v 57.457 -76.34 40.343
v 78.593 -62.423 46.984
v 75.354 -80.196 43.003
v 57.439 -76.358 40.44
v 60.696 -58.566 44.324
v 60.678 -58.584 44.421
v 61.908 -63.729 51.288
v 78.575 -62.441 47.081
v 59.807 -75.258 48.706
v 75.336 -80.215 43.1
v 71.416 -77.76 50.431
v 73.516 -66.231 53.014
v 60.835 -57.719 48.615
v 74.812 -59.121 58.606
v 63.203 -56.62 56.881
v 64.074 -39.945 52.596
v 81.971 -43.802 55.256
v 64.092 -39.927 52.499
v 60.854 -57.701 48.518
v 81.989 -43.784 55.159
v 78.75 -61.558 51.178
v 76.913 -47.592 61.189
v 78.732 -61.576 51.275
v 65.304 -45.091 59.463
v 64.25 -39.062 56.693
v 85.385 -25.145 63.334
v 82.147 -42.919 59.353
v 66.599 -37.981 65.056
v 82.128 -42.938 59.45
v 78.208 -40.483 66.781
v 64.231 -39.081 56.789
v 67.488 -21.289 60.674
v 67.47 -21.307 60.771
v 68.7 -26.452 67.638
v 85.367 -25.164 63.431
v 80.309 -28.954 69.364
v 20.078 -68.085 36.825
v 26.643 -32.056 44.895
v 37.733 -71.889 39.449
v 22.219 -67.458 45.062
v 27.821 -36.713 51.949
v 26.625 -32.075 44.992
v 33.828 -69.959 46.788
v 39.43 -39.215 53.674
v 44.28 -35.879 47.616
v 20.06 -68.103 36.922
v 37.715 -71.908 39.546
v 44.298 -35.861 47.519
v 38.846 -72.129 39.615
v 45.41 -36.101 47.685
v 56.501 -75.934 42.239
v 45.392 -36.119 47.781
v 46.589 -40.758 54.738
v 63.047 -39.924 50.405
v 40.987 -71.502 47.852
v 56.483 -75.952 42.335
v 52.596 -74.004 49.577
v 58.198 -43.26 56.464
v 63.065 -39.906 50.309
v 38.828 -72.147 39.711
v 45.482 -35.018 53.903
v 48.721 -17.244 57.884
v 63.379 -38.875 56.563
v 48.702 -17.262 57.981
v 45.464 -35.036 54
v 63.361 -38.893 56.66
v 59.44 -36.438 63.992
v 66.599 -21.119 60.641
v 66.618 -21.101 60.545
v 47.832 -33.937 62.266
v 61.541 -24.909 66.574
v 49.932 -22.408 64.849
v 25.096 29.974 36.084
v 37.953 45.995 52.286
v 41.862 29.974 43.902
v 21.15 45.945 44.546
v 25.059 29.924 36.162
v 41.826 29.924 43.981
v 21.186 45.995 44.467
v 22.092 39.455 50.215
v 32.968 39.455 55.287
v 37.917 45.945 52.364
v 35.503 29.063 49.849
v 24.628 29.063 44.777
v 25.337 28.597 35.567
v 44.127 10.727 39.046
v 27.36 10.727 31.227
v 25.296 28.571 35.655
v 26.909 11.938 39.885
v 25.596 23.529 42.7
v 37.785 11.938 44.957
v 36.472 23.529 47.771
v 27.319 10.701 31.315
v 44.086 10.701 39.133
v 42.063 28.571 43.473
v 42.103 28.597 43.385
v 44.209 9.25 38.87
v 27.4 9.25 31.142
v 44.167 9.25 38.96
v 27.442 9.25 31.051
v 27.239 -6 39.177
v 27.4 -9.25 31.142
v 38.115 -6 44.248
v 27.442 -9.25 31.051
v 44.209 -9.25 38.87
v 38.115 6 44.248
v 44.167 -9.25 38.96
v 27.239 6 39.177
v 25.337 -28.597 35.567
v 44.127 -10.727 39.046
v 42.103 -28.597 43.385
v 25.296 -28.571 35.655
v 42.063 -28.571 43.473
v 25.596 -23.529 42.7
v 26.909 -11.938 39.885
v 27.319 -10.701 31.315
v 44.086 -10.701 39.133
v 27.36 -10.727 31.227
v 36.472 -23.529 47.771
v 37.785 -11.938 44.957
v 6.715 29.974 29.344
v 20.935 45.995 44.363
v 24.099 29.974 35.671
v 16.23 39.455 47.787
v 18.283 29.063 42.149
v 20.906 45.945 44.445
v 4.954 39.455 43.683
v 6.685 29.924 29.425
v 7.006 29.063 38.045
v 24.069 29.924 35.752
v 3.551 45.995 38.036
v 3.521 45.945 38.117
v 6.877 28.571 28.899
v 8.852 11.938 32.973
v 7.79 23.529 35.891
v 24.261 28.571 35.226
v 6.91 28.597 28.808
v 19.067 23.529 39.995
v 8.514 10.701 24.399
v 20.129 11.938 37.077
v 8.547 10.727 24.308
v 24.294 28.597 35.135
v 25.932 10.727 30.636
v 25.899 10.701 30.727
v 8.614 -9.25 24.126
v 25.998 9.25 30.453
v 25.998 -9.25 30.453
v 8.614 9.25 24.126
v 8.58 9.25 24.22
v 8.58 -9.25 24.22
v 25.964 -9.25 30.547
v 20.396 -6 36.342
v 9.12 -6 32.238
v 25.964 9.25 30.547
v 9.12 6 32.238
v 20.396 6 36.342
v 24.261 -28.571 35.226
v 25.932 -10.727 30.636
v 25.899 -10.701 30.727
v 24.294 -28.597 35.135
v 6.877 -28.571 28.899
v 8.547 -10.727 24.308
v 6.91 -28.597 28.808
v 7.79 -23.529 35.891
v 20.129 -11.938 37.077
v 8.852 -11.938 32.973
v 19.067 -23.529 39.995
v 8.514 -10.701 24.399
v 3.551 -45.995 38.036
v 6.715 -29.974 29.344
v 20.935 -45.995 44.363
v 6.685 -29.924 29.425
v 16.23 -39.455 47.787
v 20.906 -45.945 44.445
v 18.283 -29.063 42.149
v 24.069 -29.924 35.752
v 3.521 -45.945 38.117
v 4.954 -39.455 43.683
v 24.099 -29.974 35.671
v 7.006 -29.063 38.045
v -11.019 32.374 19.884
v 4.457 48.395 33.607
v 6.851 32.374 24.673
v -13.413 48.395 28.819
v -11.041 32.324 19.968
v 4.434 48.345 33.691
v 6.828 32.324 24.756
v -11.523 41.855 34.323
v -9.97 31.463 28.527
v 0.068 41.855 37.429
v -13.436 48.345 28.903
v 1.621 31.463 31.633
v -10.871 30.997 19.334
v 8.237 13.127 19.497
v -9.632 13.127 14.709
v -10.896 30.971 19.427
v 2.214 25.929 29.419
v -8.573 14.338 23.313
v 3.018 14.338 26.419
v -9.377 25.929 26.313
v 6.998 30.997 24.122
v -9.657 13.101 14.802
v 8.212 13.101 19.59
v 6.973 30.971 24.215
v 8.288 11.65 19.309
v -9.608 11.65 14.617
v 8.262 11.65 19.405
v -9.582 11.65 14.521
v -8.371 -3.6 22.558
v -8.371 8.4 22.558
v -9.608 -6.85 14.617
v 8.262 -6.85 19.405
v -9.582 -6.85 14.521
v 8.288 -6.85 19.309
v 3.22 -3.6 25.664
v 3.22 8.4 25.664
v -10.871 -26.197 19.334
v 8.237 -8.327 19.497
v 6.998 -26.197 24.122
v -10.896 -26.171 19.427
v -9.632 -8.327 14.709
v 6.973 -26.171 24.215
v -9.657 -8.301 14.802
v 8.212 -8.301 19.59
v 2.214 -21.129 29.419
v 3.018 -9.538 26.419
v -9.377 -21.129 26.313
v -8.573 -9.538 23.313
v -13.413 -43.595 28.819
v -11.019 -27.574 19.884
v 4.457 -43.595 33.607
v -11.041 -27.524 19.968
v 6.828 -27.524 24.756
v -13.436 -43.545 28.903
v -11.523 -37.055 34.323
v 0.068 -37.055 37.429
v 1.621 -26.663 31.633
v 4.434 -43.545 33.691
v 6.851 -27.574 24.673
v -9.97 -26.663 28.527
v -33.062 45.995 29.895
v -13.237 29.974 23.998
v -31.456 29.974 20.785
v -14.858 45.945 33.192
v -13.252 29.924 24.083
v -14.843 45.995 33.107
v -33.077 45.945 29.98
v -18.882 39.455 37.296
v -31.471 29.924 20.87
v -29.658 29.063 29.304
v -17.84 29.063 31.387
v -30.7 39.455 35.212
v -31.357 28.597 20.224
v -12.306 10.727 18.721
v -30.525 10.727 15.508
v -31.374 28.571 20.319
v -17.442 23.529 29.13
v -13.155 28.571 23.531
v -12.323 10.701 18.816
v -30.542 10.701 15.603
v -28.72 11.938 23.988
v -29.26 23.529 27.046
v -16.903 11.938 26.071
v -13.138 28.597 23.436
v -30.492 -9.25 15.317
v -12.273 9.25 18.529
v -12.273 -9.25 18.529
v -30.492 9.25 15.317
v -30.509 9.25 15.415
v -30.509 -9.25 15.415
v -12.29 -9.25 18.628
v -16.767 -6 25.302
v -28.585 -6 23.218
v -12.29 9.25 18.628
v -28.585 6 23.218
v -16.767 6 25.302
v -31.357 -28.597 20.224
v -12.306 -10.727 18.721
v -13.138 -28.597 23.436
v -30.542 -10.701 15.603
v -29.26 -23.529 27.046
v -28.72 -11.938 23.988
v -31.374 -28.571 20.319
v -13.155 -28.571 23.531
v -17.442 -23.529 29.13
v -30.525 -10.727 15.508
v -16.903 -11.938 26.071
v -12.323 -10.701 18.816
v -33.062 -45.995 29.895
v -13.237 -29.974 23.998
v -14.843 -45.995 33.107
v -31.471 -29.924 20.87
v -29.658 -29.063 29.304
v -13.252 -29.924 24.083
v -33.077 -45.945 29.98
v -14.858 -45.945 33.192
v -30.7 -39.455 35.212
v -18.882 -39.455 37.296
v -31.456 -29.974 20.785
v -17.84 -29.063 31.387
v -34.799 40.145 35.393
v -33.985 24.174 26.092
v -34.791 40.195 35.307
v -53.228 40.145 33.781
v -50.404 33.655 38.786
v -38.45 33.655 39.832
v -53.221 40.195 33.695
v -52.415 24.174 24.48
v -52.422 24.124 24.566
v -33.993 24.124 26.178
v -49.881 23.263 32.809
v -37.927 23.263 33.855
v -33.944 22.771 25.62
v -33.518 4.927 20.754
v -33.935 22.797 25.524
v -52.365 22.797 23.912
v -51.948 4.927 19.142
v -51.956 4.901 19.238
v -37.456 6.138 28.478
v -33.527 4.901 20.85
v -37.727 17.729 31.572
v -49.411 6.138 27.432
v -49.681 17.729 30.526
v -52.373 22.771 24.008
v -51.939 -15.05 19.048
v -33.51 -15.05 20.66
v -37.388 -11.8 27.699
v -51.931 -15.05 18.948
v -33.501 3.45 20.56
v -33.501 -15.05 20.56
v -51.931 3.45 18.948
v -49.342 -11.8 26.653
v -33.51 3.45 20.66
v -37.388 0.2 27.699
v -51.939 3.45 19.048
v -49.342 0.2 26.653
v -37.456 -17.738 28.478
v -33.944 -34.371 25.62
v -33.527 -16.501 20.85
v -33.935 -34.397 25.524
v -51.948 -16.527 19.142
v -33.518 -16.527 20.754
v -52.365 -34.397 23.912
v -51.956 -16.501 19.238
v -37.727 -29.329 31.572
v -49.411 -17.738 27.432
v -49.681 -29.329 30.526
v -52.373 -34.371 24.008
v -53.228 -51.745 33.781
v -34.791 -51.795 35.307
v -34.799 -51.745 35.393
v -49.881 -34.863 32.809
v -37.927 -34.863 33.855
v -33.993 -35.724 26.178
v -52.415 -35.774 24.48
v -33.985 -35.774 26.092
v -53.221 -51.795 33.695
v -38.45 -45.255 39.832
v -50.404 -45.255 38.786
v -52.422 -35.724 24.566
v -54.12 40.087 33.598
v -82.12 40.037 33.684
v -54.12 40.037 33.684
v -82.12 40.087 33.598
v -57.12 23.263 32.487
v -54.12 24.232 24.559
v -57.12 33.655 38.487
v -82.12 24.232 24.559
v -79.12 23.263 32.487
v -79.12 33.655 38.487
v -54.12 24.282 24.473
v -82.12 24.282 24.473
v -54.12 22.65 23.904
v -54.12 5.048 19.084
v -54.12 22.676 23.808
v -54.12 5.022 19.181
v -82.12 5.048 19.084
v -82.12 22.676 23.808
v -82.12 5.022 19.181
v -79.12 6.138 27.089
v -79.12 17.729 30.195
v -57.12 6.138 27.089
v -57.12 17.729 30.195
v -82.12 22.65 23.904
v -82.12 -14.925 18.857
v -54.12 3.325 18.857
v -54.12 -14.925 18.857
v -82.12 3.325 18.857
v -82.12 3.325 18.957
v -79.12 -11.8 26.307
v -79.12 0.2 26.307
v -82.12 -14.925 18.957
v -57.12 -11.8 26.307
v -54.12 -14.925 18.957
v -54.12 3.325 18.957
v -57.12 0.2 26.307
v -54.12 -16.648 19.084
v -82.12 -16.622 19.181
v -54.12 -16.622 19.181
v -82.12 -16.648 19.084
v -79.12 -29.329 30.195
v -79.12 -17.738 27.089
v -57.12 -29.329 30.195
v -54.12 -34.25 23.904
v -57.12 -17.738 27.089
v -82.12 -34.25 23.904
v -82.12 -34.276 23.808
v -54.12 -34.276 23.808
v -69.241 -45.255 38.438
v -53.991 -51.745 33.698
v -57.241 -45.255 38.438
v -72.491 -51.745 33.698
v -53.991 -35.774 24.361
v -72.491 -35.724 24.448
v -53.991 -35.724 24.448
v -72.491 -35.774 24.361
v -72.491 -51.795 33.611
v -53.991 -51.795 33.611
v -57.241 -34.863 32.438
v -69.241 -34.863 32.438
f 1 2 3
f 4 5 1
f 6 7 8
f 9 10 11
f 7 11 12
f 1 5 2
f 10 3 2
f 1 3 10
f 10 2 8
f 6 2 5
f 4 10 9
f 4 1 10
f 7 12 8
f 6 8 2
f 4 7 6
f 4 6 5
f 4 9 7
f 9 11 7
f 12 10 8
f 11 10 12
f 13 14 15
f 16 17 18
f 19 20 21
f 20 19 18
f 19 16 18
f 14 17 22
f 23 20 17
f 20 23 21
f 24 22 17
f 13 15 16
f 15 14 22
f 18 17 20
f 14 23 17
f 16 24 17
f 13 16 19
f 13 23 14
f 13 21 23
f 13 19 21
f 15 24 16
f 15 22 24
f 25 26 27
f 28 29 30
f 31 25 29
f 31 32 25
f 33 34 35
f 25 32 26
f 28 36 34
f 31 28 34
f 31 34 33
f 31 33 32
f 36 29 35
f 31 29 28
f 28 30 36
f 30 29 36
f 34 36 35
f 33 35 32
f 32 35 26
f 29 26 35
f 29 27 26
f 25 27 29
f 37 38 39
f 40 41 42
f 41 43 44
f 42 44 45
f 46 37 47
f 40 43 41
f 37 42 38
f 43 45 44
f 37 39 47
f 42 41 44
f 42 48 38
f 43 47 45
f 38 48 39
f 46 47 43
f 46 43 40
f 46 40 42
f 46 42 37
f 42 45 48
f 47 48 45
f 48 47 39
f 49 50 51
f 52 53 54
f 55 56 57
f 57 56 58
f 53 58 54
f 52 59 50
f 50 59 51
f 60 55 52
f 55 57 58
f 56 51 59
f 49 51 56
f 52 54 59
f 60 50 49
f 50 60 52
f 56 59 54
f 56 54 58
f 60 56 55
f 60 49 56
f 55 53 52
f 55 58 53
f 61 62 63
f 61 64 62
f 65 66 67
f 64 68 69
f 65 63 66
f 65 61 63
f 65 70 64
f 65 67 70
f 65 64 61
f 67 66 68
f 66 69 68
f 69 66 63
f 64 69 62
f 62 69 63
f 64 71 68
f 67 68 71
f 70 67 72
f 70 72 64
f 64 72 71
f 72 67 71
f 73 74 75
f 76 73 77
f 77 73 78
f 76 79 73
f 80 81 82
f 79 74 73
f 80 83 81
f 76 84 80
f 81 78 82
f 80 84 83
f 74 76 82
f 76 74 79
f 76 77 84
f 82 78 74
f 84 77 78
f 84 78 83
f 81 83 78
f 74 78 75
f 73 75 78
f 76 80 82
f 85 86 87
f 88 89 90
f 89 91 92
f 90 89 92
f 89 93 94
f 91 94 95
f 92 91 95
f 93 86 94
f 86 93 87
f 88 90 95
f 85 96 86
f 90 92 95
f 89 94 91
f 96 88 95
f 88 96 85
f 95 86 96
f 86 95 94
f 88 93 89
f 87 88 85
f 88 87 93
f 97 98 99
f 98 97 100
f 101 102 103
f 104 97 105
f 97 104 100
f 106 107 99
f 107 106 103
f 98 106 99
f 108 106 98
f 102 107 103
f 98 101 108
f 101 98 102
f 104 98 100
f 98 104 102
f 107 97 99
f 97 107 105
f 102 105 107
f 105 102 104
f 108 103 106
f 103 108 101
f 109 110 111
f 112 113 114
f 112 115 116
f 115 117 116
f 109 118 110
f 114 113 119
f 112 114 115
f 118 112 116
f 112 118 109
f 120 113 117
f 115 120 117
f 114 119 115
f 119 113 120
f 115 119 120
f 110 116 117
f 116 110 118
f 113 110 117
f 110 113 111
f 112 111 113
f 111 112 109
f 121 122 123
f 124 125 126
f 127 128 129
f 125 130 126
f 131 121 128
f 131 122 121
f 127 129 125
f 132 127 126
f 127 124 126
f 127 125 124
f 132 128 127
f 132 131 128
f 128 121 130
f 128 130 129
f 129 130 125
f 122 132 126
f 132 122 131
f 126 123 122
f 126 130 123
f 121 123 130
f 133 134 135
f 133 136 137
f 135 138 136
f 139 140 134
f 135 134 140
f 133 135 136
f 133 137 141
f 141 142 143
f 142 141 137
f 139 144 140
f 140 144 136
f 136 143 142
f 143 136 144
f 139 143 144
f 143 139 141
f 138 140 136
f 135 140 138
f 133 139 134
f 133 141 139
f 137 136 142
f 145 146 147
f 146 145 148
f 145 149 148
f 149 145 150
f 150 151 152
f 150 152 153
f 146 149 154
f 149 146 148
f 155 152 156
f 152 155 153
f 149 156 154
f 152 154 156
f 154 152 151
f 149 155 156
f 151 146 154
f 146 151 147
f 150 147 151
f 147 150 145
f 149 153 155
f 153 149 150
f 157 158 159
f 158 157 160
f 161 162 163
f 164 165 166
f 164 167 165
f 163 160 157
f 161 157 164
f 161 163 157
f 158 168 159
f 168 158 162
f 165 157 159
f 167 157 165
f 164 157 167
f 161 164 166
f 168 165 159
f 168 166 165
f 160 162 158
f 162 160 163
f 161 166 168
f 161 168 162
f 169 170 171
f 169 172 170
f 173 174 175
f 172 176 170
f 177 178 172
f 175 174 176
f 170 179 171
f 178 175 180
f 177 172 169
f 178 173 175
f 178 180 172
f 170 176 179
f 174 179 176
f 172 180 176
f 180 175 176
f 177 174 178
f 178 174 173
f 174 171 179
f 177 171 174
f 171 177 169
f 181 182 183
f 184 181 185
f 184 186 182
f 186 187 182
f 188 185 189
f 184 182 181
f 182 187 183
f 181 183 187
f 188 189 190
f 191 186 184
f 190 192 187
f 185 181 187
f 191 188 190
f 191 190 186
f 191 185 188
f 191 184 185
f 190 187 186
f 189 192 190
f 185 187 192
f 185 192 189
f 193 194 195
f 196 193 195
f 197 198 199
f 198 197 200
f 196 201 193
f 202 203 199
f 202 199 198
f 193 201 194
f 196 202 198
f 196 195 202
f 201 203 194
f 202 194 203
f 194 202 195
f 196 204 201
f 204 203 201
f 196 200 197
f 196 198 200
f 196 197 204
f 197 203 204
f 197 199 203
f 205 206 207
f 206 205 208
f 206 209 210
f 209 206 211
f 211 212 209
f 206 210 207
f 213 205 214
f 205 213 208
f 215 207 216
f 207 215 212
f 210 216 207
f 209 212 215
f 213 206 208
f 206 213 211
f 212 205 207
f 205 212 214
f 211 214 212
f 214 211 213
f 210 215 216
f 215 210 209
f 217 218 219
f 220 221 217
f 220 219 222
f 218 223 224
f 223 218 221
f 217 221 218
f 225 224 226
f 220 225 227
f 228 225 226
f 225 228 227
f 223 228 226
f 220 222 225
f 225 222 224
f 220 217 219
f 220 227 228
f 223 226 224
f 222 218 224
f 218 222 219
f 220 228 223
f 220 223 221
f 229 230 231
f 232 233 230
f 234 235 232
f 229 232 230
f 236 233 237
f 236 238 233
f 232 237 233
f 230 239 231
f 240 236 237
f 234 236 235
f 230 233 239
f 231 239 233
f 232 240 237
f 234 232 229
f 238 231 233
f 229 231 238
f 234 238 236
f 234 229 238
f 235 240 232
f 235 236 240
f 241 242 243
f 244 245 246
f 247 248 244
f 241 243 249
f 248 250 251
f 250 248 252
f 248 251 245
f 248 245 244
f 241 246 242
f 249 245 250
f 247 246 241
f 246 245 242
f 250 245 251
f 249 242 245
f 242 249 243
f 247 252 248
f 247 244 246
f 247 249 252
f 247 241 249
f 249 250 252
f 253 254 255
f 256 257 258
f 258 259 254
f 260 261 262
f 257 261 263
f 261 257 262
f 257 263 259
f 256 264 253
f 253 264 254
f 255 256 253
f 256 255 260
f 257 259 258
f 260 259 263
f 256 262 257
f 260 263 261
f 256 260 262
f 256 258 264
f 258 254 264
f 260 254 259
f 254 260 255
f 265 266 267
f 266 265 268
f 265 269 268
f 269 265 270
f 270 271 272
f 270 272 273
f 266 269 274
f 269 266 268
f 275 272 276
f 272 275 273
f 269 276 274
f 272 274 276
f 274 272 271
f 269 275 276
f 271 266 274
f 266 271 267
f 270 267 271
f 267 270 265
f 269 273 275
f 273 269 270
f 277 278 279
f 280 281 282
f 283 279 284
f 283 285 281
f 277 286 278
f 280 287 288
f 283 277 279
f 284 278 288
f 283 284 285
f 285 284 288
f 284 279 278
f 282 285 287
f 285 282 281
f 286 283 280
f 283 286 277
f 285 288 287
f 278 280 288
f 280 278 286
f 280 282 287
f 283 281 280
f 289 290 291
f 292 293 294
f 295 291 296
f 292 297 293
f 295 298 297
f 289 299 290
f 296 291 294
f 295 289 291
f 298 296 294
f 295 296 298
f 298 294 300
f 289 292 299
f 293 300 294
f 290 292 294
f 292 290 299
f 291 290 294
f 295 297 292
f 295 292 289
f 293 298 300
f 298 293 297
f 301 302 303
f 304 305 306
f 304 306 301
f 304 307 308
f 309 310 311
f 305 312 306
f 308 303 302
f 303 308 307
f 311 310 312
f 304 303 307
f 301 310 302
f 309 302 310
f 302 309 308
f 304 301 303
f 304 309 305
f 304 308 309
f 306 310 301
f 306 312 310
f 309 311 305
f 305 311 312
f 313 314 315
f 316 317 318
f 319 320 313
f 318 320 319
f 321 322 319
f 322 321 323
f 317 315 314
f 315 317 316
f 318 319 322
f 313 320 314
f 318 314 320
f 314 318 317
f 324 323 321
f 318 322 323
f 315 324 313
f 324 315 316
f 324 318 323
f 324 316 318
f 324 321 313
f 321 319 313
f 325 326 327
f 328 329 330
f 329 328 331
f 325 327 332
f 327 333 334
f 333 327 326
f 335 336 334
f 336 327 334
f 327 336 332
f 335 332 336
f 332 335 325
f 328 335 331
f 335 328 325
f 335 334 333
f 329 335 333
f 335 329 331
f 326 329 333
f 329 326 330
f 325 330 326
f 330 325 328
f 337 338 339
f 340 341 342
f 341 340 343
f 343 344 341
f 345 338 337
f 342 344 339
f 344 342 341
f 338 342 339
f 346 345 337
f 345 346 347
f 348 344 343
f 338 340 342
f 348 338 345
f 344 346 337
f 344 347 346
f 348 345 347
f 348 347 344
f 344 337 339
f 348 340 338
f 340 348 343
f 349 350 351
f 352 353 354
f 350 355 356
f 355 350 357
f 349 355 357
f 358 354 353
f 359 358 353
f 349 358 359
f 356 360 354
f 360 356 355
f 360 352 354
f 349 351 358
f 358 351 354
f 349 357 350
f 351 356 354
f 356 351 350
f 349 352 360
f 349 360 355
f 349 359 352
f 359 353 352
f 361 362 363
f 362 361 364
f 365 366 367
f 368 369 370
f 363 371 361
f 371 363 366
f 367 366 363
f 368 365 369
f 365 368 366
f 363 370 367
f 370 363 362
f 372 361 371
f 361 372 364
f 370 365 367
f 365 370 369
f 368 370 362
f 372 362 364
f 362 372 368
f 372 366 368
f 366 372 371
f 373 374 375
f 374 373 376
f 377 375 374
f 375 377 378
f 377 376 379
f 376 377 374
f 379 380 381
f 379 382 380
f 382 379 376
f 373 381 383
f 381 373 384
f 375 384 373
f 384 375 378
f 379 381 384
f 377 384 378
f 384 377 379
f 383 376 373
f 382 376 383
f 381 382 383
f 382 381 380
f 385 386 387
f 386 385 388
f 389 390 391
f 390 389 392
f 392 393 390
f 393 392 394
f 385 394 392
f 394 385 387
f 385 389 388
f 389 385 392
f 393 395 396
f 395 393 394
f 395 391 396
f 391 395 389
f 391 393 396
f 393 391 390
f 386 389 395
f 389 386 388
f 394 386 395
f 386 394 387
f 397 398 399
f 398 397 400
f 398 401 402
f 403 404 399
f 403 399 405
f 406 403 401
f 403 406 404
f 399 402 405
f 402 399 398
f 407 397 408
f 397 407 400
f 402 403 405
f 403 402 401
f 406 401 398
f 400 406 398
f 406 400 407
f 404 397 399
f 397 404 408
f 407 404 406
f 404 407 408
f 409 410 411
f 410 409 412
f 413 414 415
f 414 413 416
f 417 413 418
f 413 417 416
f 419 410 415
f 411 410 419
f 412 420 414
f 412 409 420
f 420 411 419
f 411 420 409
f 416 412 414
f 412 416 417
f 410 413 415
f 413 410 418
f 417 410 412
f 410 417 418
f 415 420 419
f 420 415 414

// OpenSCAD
mirror ([-1, 0, 0]) {
  union () {
    union () {
      translate ([-52, -45, 40]) {
        rotate (a=14.999999999999998, v=[1, 1, 0]) {
          rotate (a=11.25, v=[0, 0, 1]) {
            translate ([-0.0, -9.7, 0]) {
              translate ([17.4, 0, 0]) {
                color ([127/255, 53/85, 127/255, 1]) {
                  translate ([0, 0, 7]) {
                    hull () {
                      translate ([0, 0, 0.05]) {
                        linear_extrude (height=0.1, twist=0.0, convexity=0, center=true){
                          polygon (points=[[9.125, 18.75], [9.125, -18.75], [-9.125, -18.75], [-9.125, 18.75]]);
                        }
                      }
                      translate ([0, 0, 7.4]) {
                        linear_extrude (height=0.1, twist=0.0, convexity=0, center=true){
                          polygon (points=[[6, 16], [6, -16], [-6, -16], [-6, 16]]);
                        }
                      }
                    }
                  }
                }
              }
            }
          }
        }
      }
      translate ([-52, -45, 40]) {
        rotate (a=14.999999999999998, v=[1, 1, 0]) {
          rotate (a=11.25, v=[0, 0, 1]) {
            translate ([-19.4, -9.7, 0]) {
              translate ([17.4, 0, 0]) {
                color ([127/255, 53/85, 127/255, 1]) {
                  translate ([0, 0, 7]) {
                    hull () {
                      translate ([0, 0, 0.05]) {
                        linear_extrude (height=0.1, twist=0.0, convexity=0, center=true){
                          polygon (points=[[9.125, 18.75], [9.125, -18.75], [-9.125, -18.75], [-9.125, 18.75]]);
                        }
                      }
                      translate ([0, 0, 7.4]) {
                        linear_extrude (height=0.1, twist=0.0, convexity=0, center=true){
                          polygon (points=[[6, 16], [6, -16], [-6, -16], [-6, 16]]);
                        }
                      }
                    }
                  }
                }
              }
            }
          }
        }
      }
      translate ([-52, -45, 46]) {
        rotate (a=14.999999999999998, v=[1, 1, 0]) {
          rotate (a=11.25, v=[0, 0, 1]) {
            translate ([-19.4, 19.4, 0]) {
              translate ([17.4, 0, 0]) {
                color ([44/51, 163/255, 163/255, 1]) {
                  translate ([0, 0, 7]) {
                    hull () {
                      translate ([0, 0, 0.05]) {
                        linear_extrude (height=0.1, twist=0.0, convexity=0, center=true){
                          polygon (points=[[9.25, 9.25], [9.25, -9.25], [-9.25, -9.25], [-9.25, 9.25]]);
                        }
                      }
                      translate ([0, 0, 6]) {
                        linear_extrude (height=0.1, twist=0.0, convexity=0, center=true){
                          polygon (points=[[3.7, 3.7], [3.7, -3.7], [-3.7, -3.7], [-3.7, 3.7]]);
                        }
                      }
                      translate ([0, 0, 7.4]) {
                        linear_extrude (height=0.1, twist=0.0, convexity=0, center=true){
                          polygon (points=[[6, 6], [6, -6], [-6, -6], [-6, 6]]);
                        }
                      }
                    }
                  }
                }
              }
            }
          }
        }
      }
      union () {
        translate ([-52, -45, 38]) {
          rotate (a=14.999999999999998, v=[1, 1, 0]) {
            rotate (a=11.25, v=[0, 0, 1]) {
              translate ([-38.8, -19.4, 0]) {
                translate ([17.4, 0, 0]) {
                  color ([44/51, 163/255, 163/255, 1]) {
                    translate ([0, 0, 7]) {
                      hull () {
                        translate ([0, 0, 0.05]) {
                          linear_extrude (height=0.1, twist=0.0, convexity=0, center=true){
                            polygon (points=[[9.25, 9.25], [9.25, -9.25], [-9.25, -9.25], [-9.25, 9.25]]);
                          }
                        }
                        translate ([0, 0, 6]) {
                          linear_extrude (height=0.1, twist=0.0, convexity=0, center=true){
                            polygon (points=[[3.7, 3.7], [3.7, -3.7], [-3.7, -3.7], [-3.7, 3.7]]);
                          }
                        }
                        translate ([0, 0, 7.4]) {
                          linear_extrude (height=0.1, twist=0.0, convexity=0, center=true){
                            polygon (points=[[6, 6], [6, -6], [-6, -6], [-6, 6]]);
                          }
                        }
                      }
                    }
                  }
                }
              }
            }
          }
        }
        translate ([-52, -45, 42]) {
          rotate (a=14.999999999999998, v=[1, 1, 0]) {
            rotate (a=11.25, v=[0, 0, 1]) {
              translate ([-38.8, 0.0, 0]) {
                translate ([17.4, 0, 0]) {
                  color ([44/51, 163/255, 163/255, 1]) {
                    translate ([0, 0, 7]) {
                      hull () {
                        translate ([0, 0, 0.05]) {
                          linear_extrude (height=0.1, twist=0.0, convexity=0, center=true){
                            polygon (points=[[9.25, 9.25], [9.25, -9.25], [-9.25, -9.25], [-9.25, 9.25]]);
                          }
                        }
                        translate ([0, 0, 6]) {
                          linear_extrude (height=0.1, twist=0.0, convexity=0, center=true){
                            polygon (points=[[3.7, 3.7], [3.7, -3.7], [-3.7, -3.7], [-3.7, 3.7]]);
                          }
                        }
                        translate ([0, 0, 7.4]) {
                          linear_extrude (height=0.1, twist=0.0, convexity=0, center=true){
                            polygon (points=[[6, 6], [6, -6], [-6, -6], [-6, 6]]);
                          }
                        }
                      }
                    }
                  }
                }
              }
            }
          }
        }
        translate ([-52, -45, 46]) {
          rotate (a=14.999999999999998, v=[1, 1, 0]) {
            rotate (a=11.25, v=[0, 0, 1]) {
              translate ([-38.8, 19.4, 0]) {
                translate ([17.4, 0, 0]) {
                  color ([44/51, 163/255, 163/255, 1]) {
                    translate ([0, 0, 7]) {
                      hull () {
                        translate ([0, 0, 0.05]) {
                          linear_extrude (height=0.1, twist=0.0, convexity=0, center=true){
                            polygon (points=[[9.25, 9.25], [9.25, -9.25], [-9.25, -9.25], [-9.25, 9.25]]);
                          }
                        }
                        translate ([0, 0, 6]) {
                          linear_extrude (height=0.1, twist=0.0, convexity=0, center=true){
                            polygon (points=[[3.7, 3.7], [3.7, -3.7], [-3.7, -3.7], [-3.7, 3.7]]);
                          }
                        }
                        translate ([0, 0, 7.4]) {
                          linear_extrude (height=0.1, twist=0.0, convexity=0, center=true){
                            polygon (points=[[6, 6], [6, -6], [-6, -6], [-6, 6]]);
                          }
                        }
                      }
                    }
                  }
                }
              }
            }
          }
        }
      }
    }
    union () {
      translate ([0, 0, 14.5]) {
        rotate (a=14.999999999999998, v=[0, 1, 0]) {
          translate ([0, 0, 0]) {
            translate ([0, 0, 236.77818057271747]) {
              rotate (a=10.0, v=[0, 1, 0]) {
                translate ([0, 0, -236.77818057271747]) {
                  translate ([0, 0, 82.96861330108649]) {
                    rotate (a=29.999999999999996, v=[1, 0, 0]) {
                      translate ([0, 0, -82.96861330108649]) {
                        color ([44/51, 163/255, 163/255, 1]) {
                          translate ([0, 0, 7]) {
                            hull () {
                              translate ([0, 0, 0.05]) {
                                linear_extrude (height=0.1, twist=0.0, convexity=0, center=true){
                                  polygon (points=[[9.25, 9.25], [9.25, -9.25], [-9.25, -9.25], [-9.25, 9.25]]);
                                }
                              }
                              translate ([0, 0, 6]) {
                                linear_extrude (height=0.1, twist=0.0, convexity=0, center=true){
                                  polygon (points=[[3.7, 3.7], [3.7, -3.7], [-3.7, -3.7], [-3.7, 3.7]]);
                                }
                              }
                              translate ([0, 0, 7.4]) {
                                linear_extrude (height=0.1, twist=0.0, convexity=0, center=true){
                                  polygon (points=[[6, 6], [6, -6], [-6, -6], [-6, 6]]);
                                }
                              }
                            }
                          }
                        }
                      }
                    }
                  }
                }
              }
            }
          }
        }
      }
      translate ([0, 0, 14.5]) {
        rotate (a=14.999999999999998, v=[0, 1, 0]) {
          translate ([0, 0, 0]) {
            translate ([0, 0, 236.77818057271747]) {
              rotate (a=10.0, v=[0, 1, 0]) {
                translate ([0, 0, -236.77818057271747]) {
                  translate ([0, 0, 82.96861330108649]) {
                    rotate (a=14.999999999999998, v=[1, 0, 0]) {
                      translate ([0, 0, -82.96861330108649]) {
                        color ([44/51, 163/255, 163/255, 1]) {
                          translate ([0, 0, 7]) {
                            hull () {
                              translate ([0, 0, 0.05]) {
                                linear_extrude (height=0.1, twist=0.0, convexity=0, center=true){
                                  polygon (points=[[9.25, 9.25], [9.25, -9.25], [-9.25, -9.25], [-9.25, 9.25]]);
                                }
                              }
                              translate ([0, 0, 6]) {
                                linear_extrude (height=0.1, twist=0.0, convexity=0, center=true){
                                  polygon (points=[[3.7, 3.7], [3.7, -3.7], [-3.7, -3.7], [-3.7, 3.7]]);
                                }
                              }
                              translate ([0, 0, 7.4]) {
                                linear_extrude (height=0.1, twist=0.0, convexity=0, center=true){
                                  polygon (points=[[6, 6], [6, -6], [-6, -6], [-6, 6]]);
                                }
                              }
                            }
                          }
                        }
                      }
                    }
                  }
                }
              }
            }
          }
        }
      }
      translate ([0, 0, 14.5]) {
        rotate (a=14.999999999999998, v=[0, 1, 0]) {
          translate ([0, 0, 0]) {
            translate ([0, 0, 236.77818057271747]) {
              rotate (a=10.0, v=[0, 1, 0]) {
                translate ([0, 0, -236.77818057271747]) {
                  translate ([0, 0, 82.96861330108649]) {
                    rotate (a=0.0, v=[1, 0, 0]) {
                      translate ([0, 0, -82.96861330108649]) {
                        color ([44/51, 163/255, 163/255, 1]) {
                          translate ([0, 0, 7]) {
                            hull () {
                              translate ([0, 0, 0.05]) {
                                linear_extrude (height=0.1, twist=0.0, convexity=0, center=true){
                                  polygon (points=[[9.25, 9.25], [9.25, -9.25], [-9.25, -9.25], [-9.25, 9.25]]);
                                }
                              }
                              translate ([0, 0, 6]) {
                                linear_extrude (height=0.1, twist=0.0, convexity=0, center=true){
                                  polygon (points=[[3.7, 3.7], [3.7, -3.7], [-3.7, -3.7], [-3.7, 3.7]]);
                                }
                              }
                              translate ([0, 0, 7.4]) {
                                linear_extrude (height=0.1, twist=0.0, convexity=0, center=true){
                                  polygon (points=[[6, 6], [6, -6], [-6, -6], [-6, 6]]);
                                }
                              }
                            }
                          }
                        }
                      }
                    }
                  }
                }
              }
            }
          }
        }
      }
      translate ([0, 0, 14.5]) {
        rotate (a=14.999999999999998, v=[0, 1, 0]) {
          translate ([0, 0, 0]) {
            translate ([0, 0, 236.77818057271747]) {
              rotate (a=10.0, v=[0, 1, 0]) {
                translate ([0, 0, -236.77818057271747]) {
                  translate ([0, 0, 82.96861330108649]) {
                    rotate (a=-14.999999999999998, v=[1, 0, 0]) {
                      translate ([0, 0, -82.96861330108649]) {
                        color ([44/51, 163/255, 163/255, 1]) {
                          translate ([0, 0, 7]) {
                            hull () {
                              translate ([0, 0, 0.05]) {
                                linear_extrude (height=0.1, twist=0.0, convexity=0, center=true){
                                  polygon (points=[[9.25, 9.25], [9.25, -9.25], [-9.25, -9.25], [-9.25, 9.25]]);
                                }
                              }
                              translate ([0, 0, 6]) {
                                linear_extrude (height=0.1, twist=0.0, convexity=0, center=true){
                                  polygon (points=[[3.7, 3.7], [3.7, -3.7], [-3.7, -3.7], [-3.7, 3.7]]);
                                }
                              }
                              translate ([0, 0, 7.4]) {
                                linear_extrude (height=0.1, twist=0.0, convexity=0, center=true){
                                  polygon (points=[[6, 6], [6, -6], [-6, -6], [-6, 6]]);
                                }
                              }
                            }
                          }
                        }
                      }
                    }
                  }
                }
              }
            }
          }
        }
      }
      translate ([0, 0, 14.5]) {
        rotate (a=14.999999999999998, v=[0, 1, 0]) {
          translate ([0, 0, 0]) {
            translate ([0, 0, 236.77818057271747]) {
              rotate (a=5.0, v=[0, 1, 0]) {
                translate ([0, 0, -236.77818057271747]) {
                  translate ([0, 0, 82.96861330108649]) {
                    rotate (a=29.999999999999996, v=[1, 0, 0]) {
                      translate ([0, 0, -82.96861330108649]) {
                        color ([44/51, 163/255, 163/255, 1]) {
                          translate ([0, 0, 7]) {
                            hull () {
                              translate ([0, 0, 0.05]) {
                                linear_extrude (height=0.1, twist=0.0, convexity=0, center=true){
                                  polygon (points=[[9.25, 9.25], [9.25, -9.25], [-9.25, -9.25], [-9.25, 9.25]]);
                                }
                              }
                              translate ([0, 0, 6]) {
                                linear_extrude (height=0.1, twist=0.0, convexity=0, center=true){
                                  polygon (points=[[3.7, 3.7], [3.7, -3.7], [-3.7, -3.7], [-3.7, 3.7]]);
                                }
                              }
                              translate ([0, 0, 7.4]) {
                                linear_extrude (height=0.1, twist=0.0, convexity=0, center=true){
                                  polygon (points=[[6, 6], [6, -6], [-6, -6], [-6, 6]]);
                                }
                              }
                            }
                          }
                        }
                      }
                    }
                  }
                }
              }
            }
          }
        }
      }
      translate ([0, 0, 14.5]) {
        rotate (a=14.999999999999998, v=[0, 1, 0]) {
          translate ([0, 0, 0]) {
            translate ([0, 0, 236.77818057271747]) {
              rotate (a=5.0, v=[0, 1, 0]) {
                translate ([0, 0, -236.77818057271747]) {
                  translate ([0, 0, 82.96861330108649]) {
                    rotate (a=14.999999999999998, v=[1, 0, 0]) {
                      translate ([0, 0, -82.96861330108649]) {
                        color ([44/51, 163/255, 163/255, 1]) {
                          translate ([0, 0, 7]) {
                            hull () {
                              translate ([0, 0, 0.05]) {
                                linear_extrude (height=0.1, twist=0.0, convexity=0, center=true){
                                  polygon (points=[[9.25, 9.25], [9.25, -9.25], [-9.25, -9.25], [-9.25, 9.25]]);
                                }
                              }
                              translate ([0, 0, 6]) {
                                linear_extrude (height=0.1, twist=0.0, convexity=0, center=true){
                                  polygon (points=[[3.7, 3.7], [3.7, -3.7], [-3.7, -3.7], [-3.7, 3.7]]);
                                }
                              }
                              translate ([0, 0, 7.4]) {
                                linear_extrude (height=0.1, twist=0.0, convexity=0, center=true){
                                  polygon (points=[[6, 6], [6, -6], [-6, -6], [-6, 6]]);
                                }
                              }
                            }
                          }
                        }
                      }
                    }
                  }
                }
              }
            }
          }
        }
      }
      translate ([0, 0, 14.5]) {
        rotate (a=14.999999999999998, v=[0, 1, 0]) {
          translate ([0, 0, 0]) {
            translate ([0, 0, 236.77818057271747]) {
              rotate (a=5.0, v=[0, 1, 0]) {
                translate ([0, 0, -236.77818057271747]) {
                  translate ([0, 0, 82.96861330108649]) {
                    rotate (a=0.0, v=[1, 0, 0]) {
                      translate ([0, 0, -82.96861330108649]) {
                        color ([44/51, 163/255, 163/255, 1]) {
                          translate ([0, 0, 7]) {
                            hull () {
                              translate ([0, 0, 0.05]) {
                                linear_extrude (height=0.1, twist=0.0, convexity=0, center=true){
                                  polygon (points=[[9.25, 9.25], [9.25, -9.25], [-9.25, -9.25], [-9.25, 9.25]]);
                                }
                              }
                              translate ([0, 0, 6]) {
                                linear_extrude (height=0.1, twist=0.0, convexity=0, center=true){
                                  polygon (points=[[3.7, 3.7], [3.7, -3.7], [-3.7, -3.7], [-3.7, 3.7]]);
                                }
                              }
                              translate ([0, 0, 7.4]) {
                                linear_extrude (height=0.1, twist=0.0, convexity=0, center=true){
                                  polygon (points=[[6, 6], [6, -6], [-6, -6], [-6, 6]]);
                                }
                              }
                            }
                          }
                        }
                      }
                    }
                  }
                }
              }
            }
          }
        }
      }
      translate ([0, 0, 14.5]) {
        rotate (a=14.999999999999998, v=[0, 1, 0]) {
          translate ([0, 0, 0]) {
            translate ([0, 0, 236.77818057271747]) {
              rotate (a=5.0, v=[0, 1, 0]) {
                translate ([0, 0, -236.77818057271747]) {
                  translate ([0, 0, 82.96861330108649]) {
                    rotate (a=-14.999999999999998, v=[1, 0, 0]) {
                      translate ([0, 0, -82.96861330108649]) {
                        color ([44/51, 163/255, 163/255, 1]) {
                          translate ([0, 0, 7]) {
                            hull () {
                              translate ([0, 0, 0.05]) {
                                linear_extrude (height=0.1, twist=0.0, convexity=0, center=true){
                                  polygon (points=[[9.25, 9.25], [9.25, -9.25], [-9.25, -9.25], [-9.25, 9.25]]);
                                }
                              }
                              translate ([0, 0, 6]) {
                                linear_extrude (height=0.1, twist=0.0, convexity=0, center=true){
                                  polygon (points=[[3.7, 3.7], [3.7, -3.7], [-3.7, -3.7], [-3.7, 3.7]]);
                                }
                              }
                              translate ([0, 0, 7.4]) {
                                linear_extrude (height=0.1, twist=0.0, convexity=0, center=true){
                                  polygon (points=[[6, 6], [6, -6], [-6, -6], [-6, 6]]);
                                }
                              }
                            }
                          }
                        }
                      }
                    }
                  }
                }
              }
            }
          }
        }
      }
      translate ([0, 0, 14.5]) {
        rotate (a=14.999999999999998, v=[0, 1, 0]) {
          translate ([0, 0, 0]) {
            translate ([0, 0, 236.77818057271747]) {
              rotate (a=5.0, v=[0, 1, 0]) {
                translate ([0, 0, -236.77818057271747]) {
                  translate ([0, 0, 82.96861330108649]) {
                    rotate (a=-29.999999999999996, v=[1, 0, 0]) {
                      translate ([0, 0, -82.96861330108649]) {
                        color ([44/51, 163/255, 163/255, 1]) {
                          translate ([0, 0, 7]) {
                            hull () {
                              translate ([0, 0, 0.05]) {
                                linear_extrude (height=0.1, twist=0.0, convexity=0, center=true){
                                  polygon (points=[[9.25, 9.25], [9.25, -9.25], [-9.25, -9.25], [-9.25, 9.25]]);
                                }
                              }
                              translate ([0, 0, 6]) {
                                linear_extrude (height=0.1, twist=0.0, convexity=0, center=true){
                                  polygon (points=[[3.7, 3.7], [3.7, -3.7], [-3.7, -3.7], [-3.7, 3.7]]);
                                }
                              }
                              translate ([0, 0, 7.4]) {
                                linear_extrude (height=0.1, twist=0.0, convexity=0, center=true){
                                  polygon (points=[[6, 6], [6, -6], [-6, -6], [-6, 6]]);
                                }
                              }
                            }
                          }
                        }
                      }
                    }
                  }
                }
              }
            }
          }
        }
      }
      translate ([0, 0, 14.5]) {
        rotate (a=14.999999999999998, v=[0, 1, 0]) {
          translate ([0, 2.4, -4.5]) {
            translate ([0, 0, 236.77818057271747]) {
              rotate (a=0.0, v=[0, 1, 0]) {
                translate ([0, 0, -236.77818057271747]) {
                  translate ([0, 0, 82.96861330108649]) {
                    rotate (a=29.999999999999996, v=[1, 0, 0]) {
                      translate ([0, 0, -82.96861330108649]) {
                        color ([44/51, 163/255, 163/255, 1]) {
                          translate ([0, 0, 7]) {
                            hull () {
                              translate ([0, 0, 0.05]) {
                                linear_extrude (height=0.1, twist=0.0, convexity=0, center=true){
                                  polygon (points=[[9.25, 9.25], [9.25, -9.25], [-9.25, -9.25], [-9.25, 9.25]]);
                                }
                              }
                              translate ([0, 0, 6]) {
                                linear_extrude (height=0.1, twist=0.0, convexity=0, center=true){
                                  polygon (points=[[3.7, 3.7], [3.7, -3.7], [-3.7, -3.7], [-3.7, 3.7]]);
                                }
                              }
                              translate ([0, 0, 7.4]) {
                                linear_extrude (height=0.1, twist=0.0, convexity=0, center=true){
                                  polygon (points=[[6, 6], [6, -6], [-6, -6], [-6, 6]]);
                                }
                              }
                            }
                          }
                        }
                      }
                    }
                  }
                }
              }
            }
          }
        }
      }
      translate ([0, 0, 14.5]) {
        rotate (a=14.999999999999998, v=[0, 1, 0]) {
          translate ([0, 2.4, -4.5]) {
            translate ([0, 0, 236.77818057271747]) {
              rotate (a=0.0, v=[0, 1, 0]) {
                translate ([0, 0, -236.77818057271747]) {
                  translate ([0, 0, 82.96861330108649]) {
                    rotate (a=14.999999999999998, v=[1, 0, 0]) {
                      translate ([0, 0, -82.96861330108649]) {
                        color ([44/51, 163/255, 163/255, 1]) {
                          translate ([0, 0, 7]) {
                            hull () {
                              translate ([0, 0, 0.05]) {
                                linear_extrude (height=0.1, twist=0.0, convexity=0, center=true){
                                  polygon (points=[[9.25, 9.25], [9.25, -9.25], [-9.25, -9.25], [-9.25, 9.25]]);
                                }
                              }
                              translate ([0, 0, 6]) {
                                linear_extrude (height=0.1, twist=0.0, convexity=0, center=true){
                                  polygon (points=[[3.7, 3.7], [3.7, -3.7], [-3.7, -3.7], [-3.7, 3.7]]);
                                }
                              }
                              translate ([0, 0, 7.4]) {
                                linear_extrude (height=0.1, twist=0.0, convexity=0, center=true){
                                  polygon (points=[[6, 6], [6, -6], [-6, -6], [-6, 6]]);
                                }
                              }
                            }
                          }
                        }
                      }
                    }
                  }
                }
              }
            }
          }
        }
      }
      translate ([0, 0, 14.5]) {
        rotate (a=14.999999999999998, v=[0, 1, 0]) {
          translate ([0, 2.4, -4.5]) {
            translate ([0, 0, 236.77818057271747]) {
              rotate (a=0.0, v=[0, 1, 0]) {
                translate ([0, 0, -236.77818057271747]) {
                  translate ([0, 0, 82.96861330108649]) {
                    rotate (a=0.0, v=[1, 0, 0]) {
                      translate ([0, 0, -82.96861330108649]) {
                        color ([44/51, 163/255, 163/255, 1]) {
                          translate ([0, 0, 7]) {
                            hull () {
                              translate ([0, 0, 0.05]) {
                                linear_extrude (height=0.1, twist=0.0, convexity=0, center=true){
                                  polygon (points=[[9.25, 9.25], [9.25, -9.25], [-9.25, -9.25], [-9.25, 9.25]]);
                                }
                              }
                              translate ([0, 0, 6]) {
                                linear_extrude (height=0.1, twist=0.0, convexity=0, center=true){
                                  polygon (points=[[3.7, 3.7], [3.7, -3.7], [-3.7, -3.7], [-3.7, 3.7]]);
                                }
                              }
                              translate ([0, 0, 7.4]) {
                                linear_extrude (height=0.1, twist=0.0, convexity=0, center=true){
                                  polygon (points=[[6, 6], [6, -6], [-6, -6], [-6, 6]]);
                                }
                              }
                            }
                          }
                        }
                      }
                    }
                  }
                }
              }
            }
          }
        }
      }
      translate ([0, 0, 14.5]) {
        rotate (a=14.999999999999998, v=[0, 1, 0]) {
          translate ([0, 2.4, -4.5]) {
            translate ([0, 0, 236.77818057271747]) {
              rotate (a=0.0, v=[0, 1, 0]) {
                translate ([0, 0, -236.77818057271747]) {
                  translate ([0, 0, 82.96861330108649]) {
                    rotate (a=-14.999999999999998, v=[1, 0, 0]) {
                      translate ([0, 0, -82.96861330108649]) {
                        color ([44/51, 163/255, 163/255, 1]) {
                          translate ([0, 0, 7]) {
                            hull () {
                              translate ([0, 0, 0.05]) {
                                linear_extrude (height=0.1, twist=0.0, convexity=0, center=true){
                                  polygon (points=[[9.25, 9.25], [9.25, -9.25], [-9.25, -9.25], [-9.25, 9.25]]);
                                }
                              }
                              translate ([0, 0, 6]) {
                                linear_extrude (height=0.1, twist=0.0, convexity=0, center=true){
                                  polygon (points=[[3.7, 3.7], [3.7, -3.7], [-3.7, -3.7], [-3.7, 3.7]]);
                                }
                              }
                              translate ([0, 0, 7.4]) {
                                linear_extrude (height=0.1, twist=0.0, convexity=0, center=true){
                                  polygon (points=[[6, 6], [6, -6], [-6, -6], [-6, 6]]);
                                }
                              }
                            }
                          }
                        }
                      }
                    }
                  }
                }
              }
            }
          }
        }
      }
      translate ([0, 0, 14.5]) {
        rotate (a=14.999999999999998, v=[0, 1, 0]) {
          translate ([0, 2.4, -4.5]) {
            translate ([0, 0, 236.77818057271747]) {
              rotate (a=0.0, v=[0, 1, 0]) {
                translate ([0, 0, -236.77818057271747]) {
                  translate ([0, 0, 82.96861330108649]) {
                    rotate (a=-29.999999999999996, v=[1, 0, 0]) {
                      translate ([0, 0, -82.96861330108649]) {
                        color ([44/51, 163/255, 163/255, 1]) {
                          translate ([0, 0, 7]) {
                            hull () {
                              translate ([0, 0, 0.05]) {
                                linear_extrude (height=0.1, twist=0.0, convexity=0, center=true){
                                  polygon (points=[[9.25, 9.25], [9.25, -9.25], [-9.25, -9.25], [-9.25, 9.25]]);
                                }
                              }
                              translate ([0, 0, 6]) {
                                linear_extrude (height=0.1, twist=0.0, convexity=0, center=true){
                                  polygon (points=[[3.7, 3.7], [3.7, -3.7], [-3.7, -3.7], [-3.7, 3.7]]);
                                }
                              }
                              translate ([0, 0, 7.4]) {
                                linear_extrude (height=0.1, twist=0.0, convexity=0, center=true){
                                  polygon (points=[[6, 6], [6, -6], [-6, -6], [-6, 6]]);
                                }
                              }
                            }
                          }
                        }
                      }
                    }
                  }
                }
              }
            }
          }
        }
      }
      translate ([0, 0, 14.5]) {
        rotate (a=14.999999999999998, v=[0, 1, 0]) {
          translate ([0, 0, 0]) {
            translate ([0, 0, 236.77818057271747]) {
              rotate (a=-5.0, v=[0, 1, 0]) {
                translate ([0, 0, -236.77818057271747]) {
                  translate ([0, 0, 82.96861330108649]) {
                    rotate (a=29.999999999999996, v=[1, 0, 0]) {
                      translate ([0, 0, -82.96861330108649]) {
                        color ([44/51, 163/255, 163/255, 1]) {
                          translate ([0, 0, 7]) {
                            hull () {
                              translate ([0, 0, 0.05]) {
                                linear_extrude (height=0.1, twist=0.0, convexity=0, center=true){
                                  polygon (points=[[9.25, 9.25], [9.25, -9.25], [-9.25, -9.25], [-9.25, 9.25]]);
                                }
                              }
                              translate ([0, 0, 6]) {
                                linear_extrude (height=0.1, twist=0.0, convexity=0, center=true){
                                  polygon (points=[[3.7, 3.7], [3.7, -3.7], [-3.7, -3.7], [-3.7, 3.7]]);
                                }
                              }
                              translate ([0, 0, 7.4]) {
                                linear_extrude (height=0.1, twist=0.0, convexity=0, center=true){
                                  polygon (points=[[6, 6], [6, -6], [-6, -6], [-6, 6]]);
                                }
                              }
                            }
                          }
                        }
                      }
                    }
                  }
                }
              }
            }
          }
        }
      }
      translate ([0, 0, 14.5]) {
        rotate (a=14.999999999999998, v=[0, 1, 0]) {
          translate ([0, 0, 0]) {
            translate ([0, 0, 236.77818057271747]) {
              rotate (a=-5.0, v=[0, 1, 0]) {
                translate ([0, 0, -236.77818057271747]) {
                  translate ([0, 0, 82.96861330108649]) {
                    rotate (a=14.999999999999998, v=[1, 0, 0]) {
                      translate ([0, 0, -82.96861330108649]) {
                        color ([44/51, 163/255, 163/255, 1]) {
                          translate ([0, 0, 7]) {
                            hull () {
                              translate ([0, 0, 0.05]) {
                                linear_extrude (height=0.1, twist=0.0, convexity=0, center=true){
                                  polygon (points=[[9.25, 9.25], [9.25, -9.25], [-9.25, -9.25], [-9.25, 9.25]]);
                                }
                              }
                              translate ([0, 0, 6]) {
                                linear_extrude (height=0.1, twist=0.0, convexity=0, center=true){
                                  polygon (points=[[3.7, 3.7], [3.7, -3.7], [-3.7, -3.7], [-3.7, 3.7]]);
                                }
                              }
                              translate ([0, 0, 7.4]) {
                                linear_extrude (height=0.1, twist=0.0, convexity=0, center=true){
                                  polygon (points=[[6, 6], [6, -6], [-6, -6], [-6, 6]]);
                                }
                              }
                            }
                          }
                        }
                      }
                    }
                  }
                }
              }
            }
          }
        }
      }
      translate ([0, 0, 14.5]) {
        rotate (a=14.999999999999998, v=[0, 1, 0]) {
          translate ([0, 0, 0]) {
            translate ([0, 0, 236.77818057271747]) {
              rotate (a=-5.0, v=[0, 1, 0]) {
                translate ([0, 0, -236.77818057271747]) {
                  translate ([0, 0, 82.96861330108649]) {
                    rotate (a=0.0, v=[1, 0, 0]) {
                      translate ([0, 0, -82.96861330108649]) {
                        color ([44/51, 163/255, 163/255, 1]) {
                          translate ([0, 0, 7]) {
                            hull () {
                              translate ([0, 0, 0.05]) {
                                linear_extrude (height=0.1, twist=0.0, convexity=0, center=true){
                                  polygon (points=[[9.25, 9.25], [9.25, -9.25], [-9.25, -9.25], [-9.25, 9.25]]);
                                }
                              }
                              translate ([0, 0, 6]) {
                                linear_extrude (height=0.1, twist=0.0, convexity=0, center=true){
                                  polygon (points=[[3.7, 3.7], [3.7, -3.7], [-3.7, -3.7], [-3.7, 3.7]]);
                                }
                              }
                              translate ([0, 0, 7.4]) {
                                linear_extrude (height=0.1, twist=0.0, convexity=0, center=true){
                                  polygon (points=[[6, 6], [6, -6], [-6, -6], [-6, 6]]);
                                }
                              }
                            }
                          }
                        }
                      }
                    }
                  }
                }
              }
            }
          }
        }
      }
      translate ([0, 0, 14.5]) {
        rotate (a=14.999999999999998, v=[0, 1, 0]) {
          translate ([0, 0, 0]) {
            translate ([0, 0, 236.77818057271747]) {
              rotate (a=-5.0, v=[0, 1, 0]) {
                translate ([0, 0, -236.77818057271747]) {
                  translate ([0, 0, 82.96861330108649]) {
                    rotate (a=-14.999999999999998, v=[1, 0, 0]) {
                      translate ([0, 0, -82.96861330108649]) {
                        color ([44/51, 163/255, 163/255, 1]) {
                          translate ([0, 0, 7]) {
                            hull () {
                              translate ([0, 0, 0.05]) {
                                linear_extrude (height=0.1, twist=0.0, convexity=0, center=true){
                                  polygon (points=[[9.25, 9.25], [9.25, -9.25], [-9.25, -9.25], [-9.25, 9.25]]);
                                }
                              }
                              translate ([0, 0, 6]) {
                                linear_extrude (height=0.1, twist=0.0, convexity=0, center=true){
                                  polygon (points=[[3.7, 3.7], [3.7, -3.7], [-3.7, -3.7], [-3.7, 3.7]]);
                                }
                              }
                              translate ([0, 0, 7.4]) {
                                linear_extrude (height=0.1, twist=0.0, convexity=0, center=true){
                                  polygon (points=[[6, 6], [6, -6], [-6, -6], [-6, 6]]);
                                }
                              }
                            }
                          }
                        }
                      }
                    }
                  }
                }
              }
            }
          }
        }
      }
      translate ([0, 0, 14.5]) {
        rotate (a=14.999999999999998, v=[0, 1, 0]) {
          translate ([0, 0, 0]) {
            translate ([0, 0, 236.77818057271747]) {
              rotate (a=-5.0, v=[0, 1, 0]) {
                translate ([0, 0, -236.77818057271747]) {
                  translate ([0, 0, 82.96861330108649]) {
                    rotate (a=-29.999999999999996, v=[1, 0, 0]) {
                      translate ([0, 0, -82.96861330108649]) {
                        color ([44/51, 163/255, 163/255, 1]) {
                          translate ([0, 0, 7]) {
                            hull () {
                              translate ([0, 0, 0.05]) {
                                linear_extrude (height=0.1, twist=0.0, convexity=0, center=true){
                                  polygon (points=[[9.25, 9.25], [9.25, -9.25], [-9.25, -9.25], [-9.25, 9.25]]);
                                }
                              }
                              translate ([0, 0, 6]) {
                                linear_extrude (height=0.1, twist=0.0, convexity=0, center=true){
                                  polygon (points=[[3.7, 3.7], [3.7, -3.7], [-3.7, -3.7], [-3.7, 3.7]]);
                                }
                              }
                              translate ([0, 0, 7.4]) {
                                linear_extrude (height=0.1, twist=0.0, convexity=0, center=true){
                                  polygon (points=[[6, 6], [6, -6], [-6, -6], [-6, 6]]);
                                }
                              }
                            }
                          }
                        }
                      }
                    }
                  }
                }
              }
            }
          }
        }
      }
      translate ([0, 0, 14.5]) {
        rotate (a=14.999999999999998, v=[0, 1, 0]) {
          translate ([0, -5.8, 5.64]) {
            translate ([0, 0, 236.77818057271747]) {
              rotate (a=-10.0, v=[0, 1, 0]) {
                translate ([0, 0, -236.77818057271747]) {
                  translate ([0, 0, 82.96861330108649]) {
                    rotate (a=29.999999999999996, v=[1, 0, 0]) {
                      translate ([0, 0, -82.96861330108649]) {
                        color ([44/51, 163/255, 163/255, 1]) {
                          translate ([0, 0, 7]) {
                            hull () {
                              translate ([0, 0, 0.05]) {
                                linear_extrude (height=0.1, twist=0.0, convexity=0, center=true){
                                  polygon (points=[[9.25, 9.25], [9.25, -9.25], [-9.25, -9.25], [-9.25, 9.25]]);
                                }
                              }
                              translate ([0, 0, 6]) {
                                linear_extrude (height=0.1, twist=0.0, convexity=0, center=true){
                                  polygon (points=[[3.7, 3.7], [3.7, -3.7], [-3.7, -3.7], [-3.7, 3.7]]);
                                }
                              }
                              translate ([0, 0, 7.4]) {
                                linear_extrude (height=0.1, twist=0.0, convexity=0, center=true){
                                  polygon (points=[[6, 6], [6, -6], [-6, -6], [-6, 6]]);
                                }
                              }
                            }
                          }
                        }
                      }
                    }
                  }
                }
              }
            }
          }
        }
      }
      translate ([0, 0, 14.5]) {
        rotate (a=14.999999999999998, v=[0, 1, 0]) {
          translate ([0, -5.8, 5.64]) {
            translate ([0, 0, 236.77818057271747]) {
              rotate (a=-10.0, v=[0, 1, 0]) {
                translate ([0, 0, -236.77818057271747]) {
                  translate ([0, 0, 82.96861330108649]) {
                    rotate (a=14.999999999999998, v=[1, 0, 0]) {
                      translate ([0, 0, -82.96861330108649]) {
                        color ([44/51, 163/255, 163/255, 1]) {
                          translate ([0, 0, 7]) {
                            hull () {
                              translate ([0, 0, 0.05]) {
                                linear_extrude (height=0.1, twist=0.0, convexity=0, center=true){
                                  polygon (points=[[9.25, 9.25], [9.25, -9.25], [-9.25, -9.25], [-9.25, 9.25]]);
                                }
                              }
                              translate ([0, 0, 6]) {
                                linear_extrude (height=0.1, twist=0.0, convexity=0, center=true){
                                  polygon (points=[[3.7, 3.7], [3.7, -3.7], [-3.7, -3.7], [-3.7, 3.7]]);
                                }
                              }
                              translate ([0, 0, 7.4]) {
                                linear_extrude (height=0.1, twist=0.0, convexity=0, center=true){
                                  polygon (points=[[6, 6], [6, -6], [-6, -6], [-6, 6]]);
                                }
                              }
                            }
                          }
                        }
                      }
                    }
                  }
                }
              }
            }
          }
        }
      }
      translate ([0, 0, 14.5]) {
        rotate (a=14.999999999999998, v=[0, 1, 0]) {
          translate ([0, -5.8, 5.64]) {
            translate ([0, 0, 236.77818057271747]) {
              rotate (a=-10.0, v=[0, 1, 0]) {
                translate ([0, 0, -236.77818057271747]) {
                  translate ([0, 0, 82.96861330108649]) {
                    rotate (a=0.0, v=[1, 0, 0]) {
                      translate ([0, 0, -82.96861330108649]) {
                        color ([44/51, 163/255, 163/255, 1]) {
                          translate ([0, 0, 7]) {
                            hull () {
                              translate ([0, 0, 0.05]) {
                                linear_extrude (height=0.1, twist=0.0, convexity=0, center=true){
                                  polygon (points=[[9.25, 9.25], [9.25, -9.25], [-9.25, -9.25], [-9.25, 9.25]]);
                                }
                              }
                              translate ([0, 0, 6]) {
                                linear_extrude (height=0.1, twist=0.0, convexity=0, center=true){
                                  polygon (points=[[3.7, 3.7], [3.7, -3.7], [-3.7, -3.7], [-3.7, 3.7]]);
                                }
                              }
                              translate ([0, 0, 7.4]) {
                                linear_extrude (height=0.1, twist=0.0, convexity=0, center=true){
                                  polygon (points=[[6, 6], [6, -6], [-6, -6], [-6, 6]]);
                                }
                              }
                            }
                          }
                        }
                      }
                    }
                  }
                }
              }
            }
          }
        }
      }
      translate ([0, 0, 14.5]) {
        rotate (a=14.999999999999998, v=[0, 1, 0]) {
          translate ([0, -5.8, 5.64]) {
            translate ([0, 0, 236.77818057271747]) {
              rotate (a=-10.0, v=[0, 1, 0]) {
                translate ([0, 0, -236.77818057271747]) {
                  translate ([0, 0, 82.96861330108649]) {
                    rotate (a=-14.999999999999998, v=[1, 0, 0]) {
                      translate ([0, 0, -82.96861330108649]) {
                        color ([44/51, 163/255, 163/255, 1]) {
                          translate ([0, 0, 7]) {
                            hull () {
                              translate ([0, 0, 0.05]) {
                                linear_extrude (height=0.1, twist=0.0, convexity=0, center=true){
                                  polygon (points=[[9.25, 9.25], [9.25, -9.25], [-9.25, -9.25], [-9.25, 9.25]]);
                                }
                              }
                              translate ([0, 0, 6]) {
                                linear_extrude (height=0.1, twist=0.0, convexity=0, center=true){
                                  polygon (points=[[3.7, 3.7], [3.7, -3.7], [-3.7, -3.7], [-3.7, 3.7]]);
                                }
                              }
                              translate ([0, 0, 7.4]) {
                                linear_extrude (height=0.1, twist=0.0, convexity=0, center=true){
                                  polygon (points=[[6, 6], [6, -6], [-6, -6], [-6, 6]]);
                                }
                              }
                            }
                          }
                        }
                      }
                    }
                  }
                }
              }
            }
          }
        }
      }
      translate ([0, 0, 14.5]) {
        rotate (a=14.999999999999998, v=[0, 1, 0]) {
          translate ([0, -5.8, 5.64]) {
            translate ([0, 0, 236.77818057271747]) {
              rotate (a=-10.0, v=[0, 1, 0]) {
                translate ([0, 0, -236.77818057271747]) {
                  translate ([0, 0, 82.96861330108649]) {
                    rotate (a=-29.999999999999996, v=[1, 0, 0]) {
                      translate ([0, 0, -82.96861330108649]) {
                        color ([44/51, 163/255, 163/255, 1]) {
                          translate ([0, 0, 7]) {
                            hull () {
                              translate ([0, 0, 0.05]) {
                                linear_extrude (height=0.1, twist=0.0, convexity=0, center=true){
                                  polygon (points=[[9.25, 9.25], [9.25, -9.25], [-9.25, -9.25], [-9.25, 9.25]]);
                                }
                              }
                              translate ([0, 0, 6]) {
                                linear_extrude (height=0.1, twist=0.0, convexity=0, center=true){
                                  polygon (points=[[3.7, 3.7], [3.7, -3.7], [-3.7, -3.7], [-3.7, 3.7]]);
                                }
                              }
                              translate ([0, 0, 7.4]) {
                                linear_extrude (height=0.1, twist=0.0, convexity=0, center=true){
                                  polygon (points=[[6, 6], [6, -6], [-6, -6], [-6, 6]]);
                                }
                              }
                            }
                          }
                        }
                      }
                    }
                  }
                }
              }
            }
          }
        }
      }
      translate ([0, 0, 14.5]) {
        rotate (a=14.999999999999998, v=[0, 1, 0]) {
          translate ([5.2, -5.8, 7.01]) {
            translate ([0, 0, 236.77818057271747]) {
              rotate (a=-14.999999999999998, v=[0, 1, 0]) {
                translate ([0, 0, -236.77818057271747]) {
                  translate ([0, 0, 82.96861330108649]) {
                    rotate (a=29.999999999999996, v=[1, 0, 0]) {
                      translate ([0, 0, -82.96861330108649]) {
                        color ([16/17, 223/255, 35/51, 1]) {
                          translate ([0, 0, 7]) {
                            hull () {
                              translate ([0, 0, 0.05]) {
                                linear_extrude (height=0.1, twist=0.0, convexity=0, center=true){
                                  polygon (points=[[14, 9.125], [14, -9.125], [-14, -9.125], [-14, 9.125]]);
                                }
                              }
                              translate ([0, 0, 7.4]) {
                                linear_extrude (height=0.1, twist=0.0, convexity=0, center=true){
                                  polygon (points=[[11, 6], [-11, 6], [-11, -6], [11, -6]]);
                                }
                              }
                            }
                          }
                        }
                      }
                    }
                  }
                }
              }
            }
          }
        }
      }
      translate ([0, 0, 14.5]) {
        rotate (a=14.999999999999998, v=[0, 1, 0]) {
          translate ([5.2, -5.8, 7.01]) {
            translate ([0, 0, 236.77818057271747]) {
              rotate (a=-14.999999999999998, v=[0, 1, 0]) {
                translate ([0, 0, -236.77818057271747]) {
                  translate ([0, 0, 82.96861330108649]) {
                    rotate (a=14.999999999999998, v=[1, 0, 0]) {
                      translate ([0, 0, -82.96861330108649]) {
                        color ([16/17, 223/255, 35/51, 1]) {
                          translate ([0, 0, 7]) {
                            hull () {
                              translate ([0, 0, 0.05]) {
                                linear_extrude (height=0.1, twist=0.0, convexity=0, center=true){
                                  polygon (points=[[14, 9.125], [14, -9.125], [-14, -9.125], [-14, 9.125]]);
                                }
                              }
                              translate ([0, 0, 7.4]) {
                                linear_extrude (height=0.1, twist=0.0, convexity=0, center=true){
                                  polygon (points=[[11, 6], [-11, 6], [-11, -6], [11, -6]]);
                                }
                              }
                            }
                          }
                        }
                      }
                    }
                  }
                }
              }
            }
          }
        }
      }
      translate ([0, 0, 14.5]) {
        rotate (a=14.999999999999998, v=[0, 1, 0]) {
          translate ([5.2, -5.8, 7.01]) {
            translate ([0, 0, 236.77818057271747]) {
              rotate (a=-14.999999999999998, v=[0, 1, 0]) {
                translate ([0, 0, -236.77818057271747]) {
                  translate ([0, 0, 82.96861330108649]) {
                    rotate (a=0.0, v=[1, 0, 0]) {
                      translate ([0, 0, -82.96861330108649]) {
                        color ([16/17, 223/255, 35/51, 1]) {
                          translate ([0, 0, 7]) {
                            hull () {
                              translate ([0, 0, 0.05]) {
                                linear_extrude (height=0.1, twist=0.0, convexity=0, center=true){
                                  polygon (points=[[14, 9.125], [14, -9.125], [-14, -9.125], [-14, 9.125]]);
                                }
                              }
                              translate ([0, 0, 7.4]) {
                                linear_extrude (height=0.1, twist=0.0, convexity=0, center=true){
                                  polygon (points=[[11, 6], [-11, 6], [-11, -6], [11, -6]]);
                                }
                              }
                            }
                          }
                        }
                      }
                    }
                  }
                }
              }
            }
          }
        }
      }
      translate ([0, 0, 14.5]) {
        rotate (a=14.999999999999998, v=[0, 1, 0]) {
          translate ([5.2, -5.8, 7.01]) {
            translate ([0, 0, 236.77818057271747]) {
              rotate (a=-14.999999999999998, v=[0, 1, 0]) {
                translate ([0, 0, -236.77818057271747]) {
                  translate ([0, 0, 82.96861330108649]) {
                    rotate (a=-14.999999999999998, v=[1, 0, 0]) {
                      translate ([0, 0, -82.96861330108649]) {
                        color ([16/17, 223/255, 35/51, 1]) {
                          translate ([0, 0, 7]) {
                            hull () {
                              translate ([0, 0, 0.05]) {
                                linear_extrude (height=0.1, twist=0.0, convexity=0, center=true){
                                  polygon (points=[[14, 9.125], [14, -9.125], [-14, -9.125], [-14, 9.125]]);
                                }
                              }
                              translate ([0, 0, 7.4]) {
                                linear_extrude (height=0.1, twist=0.0, convexity=0, center=true){
                                  polygon (points=[[11, 6], [-11, 6], [-11, -6], [11, -6]]);
                                }
                              }
                            }
                          }
                        }
                      }
                    }
                  }
                }
              }
            }
          }
        }
      }
      translate ([0, 0, 14.5]) {
        rotate (a=14.999999999999998, v=[0, 1, 0]) {
          translate ([0.5, -5.8, 5.7]) {
            translate ([0, 0, 236.77818057271747]) {
              rotate (a=-14.999999999999998, v=[0, 1, 0]) {
                translate ([0, 0, -236.77818057271747]) {
                  translate ([0, 0, 82.96861330108649]) {
                    rotate (a=-29.999999999999996, v=[1, 0, 0]) {
                      translate ([0, 0, -82.96861330108649]) {
                        color ([44/51, 163/255, 163/255, 1]) {
                          translate ([0, 0, 7]) {
                            hull () {
                              translate ([0, 0, 0.05]) {
                                linear_extrude (height=0.1, twist=0.0, convexity=0, center=true){
                                  polygon (points=[[9.25, 9.25], [9.25, -9.25], [-9.25, -9.25], [-9.25, 9.25]]);
                                }
                              }
                              translate ([0, 0, 6]) {
                                linear_extrude (height=0.1, twist=0.0, convexity=0, center=true){
                                  polygon (points=[[3.7, 3.7], [3.7, -3.7], [-3.7, -3.7], [-3.7, 3.7]]);
                                }
                              }
                              translate ([0, 0, 7.4]) {
                                linear_extrude (height=0.1, twist=0.0, convexity=0, center=true){
                                  polygon (points=[[6, 6], [6, -6], [-6, -6], [-6, 6]]);
                                }
                              }
                            }
                          }
                        }
                      }
                    }
                  }
                }
              }
            }
          }
        }
      }
    }
  }
}
